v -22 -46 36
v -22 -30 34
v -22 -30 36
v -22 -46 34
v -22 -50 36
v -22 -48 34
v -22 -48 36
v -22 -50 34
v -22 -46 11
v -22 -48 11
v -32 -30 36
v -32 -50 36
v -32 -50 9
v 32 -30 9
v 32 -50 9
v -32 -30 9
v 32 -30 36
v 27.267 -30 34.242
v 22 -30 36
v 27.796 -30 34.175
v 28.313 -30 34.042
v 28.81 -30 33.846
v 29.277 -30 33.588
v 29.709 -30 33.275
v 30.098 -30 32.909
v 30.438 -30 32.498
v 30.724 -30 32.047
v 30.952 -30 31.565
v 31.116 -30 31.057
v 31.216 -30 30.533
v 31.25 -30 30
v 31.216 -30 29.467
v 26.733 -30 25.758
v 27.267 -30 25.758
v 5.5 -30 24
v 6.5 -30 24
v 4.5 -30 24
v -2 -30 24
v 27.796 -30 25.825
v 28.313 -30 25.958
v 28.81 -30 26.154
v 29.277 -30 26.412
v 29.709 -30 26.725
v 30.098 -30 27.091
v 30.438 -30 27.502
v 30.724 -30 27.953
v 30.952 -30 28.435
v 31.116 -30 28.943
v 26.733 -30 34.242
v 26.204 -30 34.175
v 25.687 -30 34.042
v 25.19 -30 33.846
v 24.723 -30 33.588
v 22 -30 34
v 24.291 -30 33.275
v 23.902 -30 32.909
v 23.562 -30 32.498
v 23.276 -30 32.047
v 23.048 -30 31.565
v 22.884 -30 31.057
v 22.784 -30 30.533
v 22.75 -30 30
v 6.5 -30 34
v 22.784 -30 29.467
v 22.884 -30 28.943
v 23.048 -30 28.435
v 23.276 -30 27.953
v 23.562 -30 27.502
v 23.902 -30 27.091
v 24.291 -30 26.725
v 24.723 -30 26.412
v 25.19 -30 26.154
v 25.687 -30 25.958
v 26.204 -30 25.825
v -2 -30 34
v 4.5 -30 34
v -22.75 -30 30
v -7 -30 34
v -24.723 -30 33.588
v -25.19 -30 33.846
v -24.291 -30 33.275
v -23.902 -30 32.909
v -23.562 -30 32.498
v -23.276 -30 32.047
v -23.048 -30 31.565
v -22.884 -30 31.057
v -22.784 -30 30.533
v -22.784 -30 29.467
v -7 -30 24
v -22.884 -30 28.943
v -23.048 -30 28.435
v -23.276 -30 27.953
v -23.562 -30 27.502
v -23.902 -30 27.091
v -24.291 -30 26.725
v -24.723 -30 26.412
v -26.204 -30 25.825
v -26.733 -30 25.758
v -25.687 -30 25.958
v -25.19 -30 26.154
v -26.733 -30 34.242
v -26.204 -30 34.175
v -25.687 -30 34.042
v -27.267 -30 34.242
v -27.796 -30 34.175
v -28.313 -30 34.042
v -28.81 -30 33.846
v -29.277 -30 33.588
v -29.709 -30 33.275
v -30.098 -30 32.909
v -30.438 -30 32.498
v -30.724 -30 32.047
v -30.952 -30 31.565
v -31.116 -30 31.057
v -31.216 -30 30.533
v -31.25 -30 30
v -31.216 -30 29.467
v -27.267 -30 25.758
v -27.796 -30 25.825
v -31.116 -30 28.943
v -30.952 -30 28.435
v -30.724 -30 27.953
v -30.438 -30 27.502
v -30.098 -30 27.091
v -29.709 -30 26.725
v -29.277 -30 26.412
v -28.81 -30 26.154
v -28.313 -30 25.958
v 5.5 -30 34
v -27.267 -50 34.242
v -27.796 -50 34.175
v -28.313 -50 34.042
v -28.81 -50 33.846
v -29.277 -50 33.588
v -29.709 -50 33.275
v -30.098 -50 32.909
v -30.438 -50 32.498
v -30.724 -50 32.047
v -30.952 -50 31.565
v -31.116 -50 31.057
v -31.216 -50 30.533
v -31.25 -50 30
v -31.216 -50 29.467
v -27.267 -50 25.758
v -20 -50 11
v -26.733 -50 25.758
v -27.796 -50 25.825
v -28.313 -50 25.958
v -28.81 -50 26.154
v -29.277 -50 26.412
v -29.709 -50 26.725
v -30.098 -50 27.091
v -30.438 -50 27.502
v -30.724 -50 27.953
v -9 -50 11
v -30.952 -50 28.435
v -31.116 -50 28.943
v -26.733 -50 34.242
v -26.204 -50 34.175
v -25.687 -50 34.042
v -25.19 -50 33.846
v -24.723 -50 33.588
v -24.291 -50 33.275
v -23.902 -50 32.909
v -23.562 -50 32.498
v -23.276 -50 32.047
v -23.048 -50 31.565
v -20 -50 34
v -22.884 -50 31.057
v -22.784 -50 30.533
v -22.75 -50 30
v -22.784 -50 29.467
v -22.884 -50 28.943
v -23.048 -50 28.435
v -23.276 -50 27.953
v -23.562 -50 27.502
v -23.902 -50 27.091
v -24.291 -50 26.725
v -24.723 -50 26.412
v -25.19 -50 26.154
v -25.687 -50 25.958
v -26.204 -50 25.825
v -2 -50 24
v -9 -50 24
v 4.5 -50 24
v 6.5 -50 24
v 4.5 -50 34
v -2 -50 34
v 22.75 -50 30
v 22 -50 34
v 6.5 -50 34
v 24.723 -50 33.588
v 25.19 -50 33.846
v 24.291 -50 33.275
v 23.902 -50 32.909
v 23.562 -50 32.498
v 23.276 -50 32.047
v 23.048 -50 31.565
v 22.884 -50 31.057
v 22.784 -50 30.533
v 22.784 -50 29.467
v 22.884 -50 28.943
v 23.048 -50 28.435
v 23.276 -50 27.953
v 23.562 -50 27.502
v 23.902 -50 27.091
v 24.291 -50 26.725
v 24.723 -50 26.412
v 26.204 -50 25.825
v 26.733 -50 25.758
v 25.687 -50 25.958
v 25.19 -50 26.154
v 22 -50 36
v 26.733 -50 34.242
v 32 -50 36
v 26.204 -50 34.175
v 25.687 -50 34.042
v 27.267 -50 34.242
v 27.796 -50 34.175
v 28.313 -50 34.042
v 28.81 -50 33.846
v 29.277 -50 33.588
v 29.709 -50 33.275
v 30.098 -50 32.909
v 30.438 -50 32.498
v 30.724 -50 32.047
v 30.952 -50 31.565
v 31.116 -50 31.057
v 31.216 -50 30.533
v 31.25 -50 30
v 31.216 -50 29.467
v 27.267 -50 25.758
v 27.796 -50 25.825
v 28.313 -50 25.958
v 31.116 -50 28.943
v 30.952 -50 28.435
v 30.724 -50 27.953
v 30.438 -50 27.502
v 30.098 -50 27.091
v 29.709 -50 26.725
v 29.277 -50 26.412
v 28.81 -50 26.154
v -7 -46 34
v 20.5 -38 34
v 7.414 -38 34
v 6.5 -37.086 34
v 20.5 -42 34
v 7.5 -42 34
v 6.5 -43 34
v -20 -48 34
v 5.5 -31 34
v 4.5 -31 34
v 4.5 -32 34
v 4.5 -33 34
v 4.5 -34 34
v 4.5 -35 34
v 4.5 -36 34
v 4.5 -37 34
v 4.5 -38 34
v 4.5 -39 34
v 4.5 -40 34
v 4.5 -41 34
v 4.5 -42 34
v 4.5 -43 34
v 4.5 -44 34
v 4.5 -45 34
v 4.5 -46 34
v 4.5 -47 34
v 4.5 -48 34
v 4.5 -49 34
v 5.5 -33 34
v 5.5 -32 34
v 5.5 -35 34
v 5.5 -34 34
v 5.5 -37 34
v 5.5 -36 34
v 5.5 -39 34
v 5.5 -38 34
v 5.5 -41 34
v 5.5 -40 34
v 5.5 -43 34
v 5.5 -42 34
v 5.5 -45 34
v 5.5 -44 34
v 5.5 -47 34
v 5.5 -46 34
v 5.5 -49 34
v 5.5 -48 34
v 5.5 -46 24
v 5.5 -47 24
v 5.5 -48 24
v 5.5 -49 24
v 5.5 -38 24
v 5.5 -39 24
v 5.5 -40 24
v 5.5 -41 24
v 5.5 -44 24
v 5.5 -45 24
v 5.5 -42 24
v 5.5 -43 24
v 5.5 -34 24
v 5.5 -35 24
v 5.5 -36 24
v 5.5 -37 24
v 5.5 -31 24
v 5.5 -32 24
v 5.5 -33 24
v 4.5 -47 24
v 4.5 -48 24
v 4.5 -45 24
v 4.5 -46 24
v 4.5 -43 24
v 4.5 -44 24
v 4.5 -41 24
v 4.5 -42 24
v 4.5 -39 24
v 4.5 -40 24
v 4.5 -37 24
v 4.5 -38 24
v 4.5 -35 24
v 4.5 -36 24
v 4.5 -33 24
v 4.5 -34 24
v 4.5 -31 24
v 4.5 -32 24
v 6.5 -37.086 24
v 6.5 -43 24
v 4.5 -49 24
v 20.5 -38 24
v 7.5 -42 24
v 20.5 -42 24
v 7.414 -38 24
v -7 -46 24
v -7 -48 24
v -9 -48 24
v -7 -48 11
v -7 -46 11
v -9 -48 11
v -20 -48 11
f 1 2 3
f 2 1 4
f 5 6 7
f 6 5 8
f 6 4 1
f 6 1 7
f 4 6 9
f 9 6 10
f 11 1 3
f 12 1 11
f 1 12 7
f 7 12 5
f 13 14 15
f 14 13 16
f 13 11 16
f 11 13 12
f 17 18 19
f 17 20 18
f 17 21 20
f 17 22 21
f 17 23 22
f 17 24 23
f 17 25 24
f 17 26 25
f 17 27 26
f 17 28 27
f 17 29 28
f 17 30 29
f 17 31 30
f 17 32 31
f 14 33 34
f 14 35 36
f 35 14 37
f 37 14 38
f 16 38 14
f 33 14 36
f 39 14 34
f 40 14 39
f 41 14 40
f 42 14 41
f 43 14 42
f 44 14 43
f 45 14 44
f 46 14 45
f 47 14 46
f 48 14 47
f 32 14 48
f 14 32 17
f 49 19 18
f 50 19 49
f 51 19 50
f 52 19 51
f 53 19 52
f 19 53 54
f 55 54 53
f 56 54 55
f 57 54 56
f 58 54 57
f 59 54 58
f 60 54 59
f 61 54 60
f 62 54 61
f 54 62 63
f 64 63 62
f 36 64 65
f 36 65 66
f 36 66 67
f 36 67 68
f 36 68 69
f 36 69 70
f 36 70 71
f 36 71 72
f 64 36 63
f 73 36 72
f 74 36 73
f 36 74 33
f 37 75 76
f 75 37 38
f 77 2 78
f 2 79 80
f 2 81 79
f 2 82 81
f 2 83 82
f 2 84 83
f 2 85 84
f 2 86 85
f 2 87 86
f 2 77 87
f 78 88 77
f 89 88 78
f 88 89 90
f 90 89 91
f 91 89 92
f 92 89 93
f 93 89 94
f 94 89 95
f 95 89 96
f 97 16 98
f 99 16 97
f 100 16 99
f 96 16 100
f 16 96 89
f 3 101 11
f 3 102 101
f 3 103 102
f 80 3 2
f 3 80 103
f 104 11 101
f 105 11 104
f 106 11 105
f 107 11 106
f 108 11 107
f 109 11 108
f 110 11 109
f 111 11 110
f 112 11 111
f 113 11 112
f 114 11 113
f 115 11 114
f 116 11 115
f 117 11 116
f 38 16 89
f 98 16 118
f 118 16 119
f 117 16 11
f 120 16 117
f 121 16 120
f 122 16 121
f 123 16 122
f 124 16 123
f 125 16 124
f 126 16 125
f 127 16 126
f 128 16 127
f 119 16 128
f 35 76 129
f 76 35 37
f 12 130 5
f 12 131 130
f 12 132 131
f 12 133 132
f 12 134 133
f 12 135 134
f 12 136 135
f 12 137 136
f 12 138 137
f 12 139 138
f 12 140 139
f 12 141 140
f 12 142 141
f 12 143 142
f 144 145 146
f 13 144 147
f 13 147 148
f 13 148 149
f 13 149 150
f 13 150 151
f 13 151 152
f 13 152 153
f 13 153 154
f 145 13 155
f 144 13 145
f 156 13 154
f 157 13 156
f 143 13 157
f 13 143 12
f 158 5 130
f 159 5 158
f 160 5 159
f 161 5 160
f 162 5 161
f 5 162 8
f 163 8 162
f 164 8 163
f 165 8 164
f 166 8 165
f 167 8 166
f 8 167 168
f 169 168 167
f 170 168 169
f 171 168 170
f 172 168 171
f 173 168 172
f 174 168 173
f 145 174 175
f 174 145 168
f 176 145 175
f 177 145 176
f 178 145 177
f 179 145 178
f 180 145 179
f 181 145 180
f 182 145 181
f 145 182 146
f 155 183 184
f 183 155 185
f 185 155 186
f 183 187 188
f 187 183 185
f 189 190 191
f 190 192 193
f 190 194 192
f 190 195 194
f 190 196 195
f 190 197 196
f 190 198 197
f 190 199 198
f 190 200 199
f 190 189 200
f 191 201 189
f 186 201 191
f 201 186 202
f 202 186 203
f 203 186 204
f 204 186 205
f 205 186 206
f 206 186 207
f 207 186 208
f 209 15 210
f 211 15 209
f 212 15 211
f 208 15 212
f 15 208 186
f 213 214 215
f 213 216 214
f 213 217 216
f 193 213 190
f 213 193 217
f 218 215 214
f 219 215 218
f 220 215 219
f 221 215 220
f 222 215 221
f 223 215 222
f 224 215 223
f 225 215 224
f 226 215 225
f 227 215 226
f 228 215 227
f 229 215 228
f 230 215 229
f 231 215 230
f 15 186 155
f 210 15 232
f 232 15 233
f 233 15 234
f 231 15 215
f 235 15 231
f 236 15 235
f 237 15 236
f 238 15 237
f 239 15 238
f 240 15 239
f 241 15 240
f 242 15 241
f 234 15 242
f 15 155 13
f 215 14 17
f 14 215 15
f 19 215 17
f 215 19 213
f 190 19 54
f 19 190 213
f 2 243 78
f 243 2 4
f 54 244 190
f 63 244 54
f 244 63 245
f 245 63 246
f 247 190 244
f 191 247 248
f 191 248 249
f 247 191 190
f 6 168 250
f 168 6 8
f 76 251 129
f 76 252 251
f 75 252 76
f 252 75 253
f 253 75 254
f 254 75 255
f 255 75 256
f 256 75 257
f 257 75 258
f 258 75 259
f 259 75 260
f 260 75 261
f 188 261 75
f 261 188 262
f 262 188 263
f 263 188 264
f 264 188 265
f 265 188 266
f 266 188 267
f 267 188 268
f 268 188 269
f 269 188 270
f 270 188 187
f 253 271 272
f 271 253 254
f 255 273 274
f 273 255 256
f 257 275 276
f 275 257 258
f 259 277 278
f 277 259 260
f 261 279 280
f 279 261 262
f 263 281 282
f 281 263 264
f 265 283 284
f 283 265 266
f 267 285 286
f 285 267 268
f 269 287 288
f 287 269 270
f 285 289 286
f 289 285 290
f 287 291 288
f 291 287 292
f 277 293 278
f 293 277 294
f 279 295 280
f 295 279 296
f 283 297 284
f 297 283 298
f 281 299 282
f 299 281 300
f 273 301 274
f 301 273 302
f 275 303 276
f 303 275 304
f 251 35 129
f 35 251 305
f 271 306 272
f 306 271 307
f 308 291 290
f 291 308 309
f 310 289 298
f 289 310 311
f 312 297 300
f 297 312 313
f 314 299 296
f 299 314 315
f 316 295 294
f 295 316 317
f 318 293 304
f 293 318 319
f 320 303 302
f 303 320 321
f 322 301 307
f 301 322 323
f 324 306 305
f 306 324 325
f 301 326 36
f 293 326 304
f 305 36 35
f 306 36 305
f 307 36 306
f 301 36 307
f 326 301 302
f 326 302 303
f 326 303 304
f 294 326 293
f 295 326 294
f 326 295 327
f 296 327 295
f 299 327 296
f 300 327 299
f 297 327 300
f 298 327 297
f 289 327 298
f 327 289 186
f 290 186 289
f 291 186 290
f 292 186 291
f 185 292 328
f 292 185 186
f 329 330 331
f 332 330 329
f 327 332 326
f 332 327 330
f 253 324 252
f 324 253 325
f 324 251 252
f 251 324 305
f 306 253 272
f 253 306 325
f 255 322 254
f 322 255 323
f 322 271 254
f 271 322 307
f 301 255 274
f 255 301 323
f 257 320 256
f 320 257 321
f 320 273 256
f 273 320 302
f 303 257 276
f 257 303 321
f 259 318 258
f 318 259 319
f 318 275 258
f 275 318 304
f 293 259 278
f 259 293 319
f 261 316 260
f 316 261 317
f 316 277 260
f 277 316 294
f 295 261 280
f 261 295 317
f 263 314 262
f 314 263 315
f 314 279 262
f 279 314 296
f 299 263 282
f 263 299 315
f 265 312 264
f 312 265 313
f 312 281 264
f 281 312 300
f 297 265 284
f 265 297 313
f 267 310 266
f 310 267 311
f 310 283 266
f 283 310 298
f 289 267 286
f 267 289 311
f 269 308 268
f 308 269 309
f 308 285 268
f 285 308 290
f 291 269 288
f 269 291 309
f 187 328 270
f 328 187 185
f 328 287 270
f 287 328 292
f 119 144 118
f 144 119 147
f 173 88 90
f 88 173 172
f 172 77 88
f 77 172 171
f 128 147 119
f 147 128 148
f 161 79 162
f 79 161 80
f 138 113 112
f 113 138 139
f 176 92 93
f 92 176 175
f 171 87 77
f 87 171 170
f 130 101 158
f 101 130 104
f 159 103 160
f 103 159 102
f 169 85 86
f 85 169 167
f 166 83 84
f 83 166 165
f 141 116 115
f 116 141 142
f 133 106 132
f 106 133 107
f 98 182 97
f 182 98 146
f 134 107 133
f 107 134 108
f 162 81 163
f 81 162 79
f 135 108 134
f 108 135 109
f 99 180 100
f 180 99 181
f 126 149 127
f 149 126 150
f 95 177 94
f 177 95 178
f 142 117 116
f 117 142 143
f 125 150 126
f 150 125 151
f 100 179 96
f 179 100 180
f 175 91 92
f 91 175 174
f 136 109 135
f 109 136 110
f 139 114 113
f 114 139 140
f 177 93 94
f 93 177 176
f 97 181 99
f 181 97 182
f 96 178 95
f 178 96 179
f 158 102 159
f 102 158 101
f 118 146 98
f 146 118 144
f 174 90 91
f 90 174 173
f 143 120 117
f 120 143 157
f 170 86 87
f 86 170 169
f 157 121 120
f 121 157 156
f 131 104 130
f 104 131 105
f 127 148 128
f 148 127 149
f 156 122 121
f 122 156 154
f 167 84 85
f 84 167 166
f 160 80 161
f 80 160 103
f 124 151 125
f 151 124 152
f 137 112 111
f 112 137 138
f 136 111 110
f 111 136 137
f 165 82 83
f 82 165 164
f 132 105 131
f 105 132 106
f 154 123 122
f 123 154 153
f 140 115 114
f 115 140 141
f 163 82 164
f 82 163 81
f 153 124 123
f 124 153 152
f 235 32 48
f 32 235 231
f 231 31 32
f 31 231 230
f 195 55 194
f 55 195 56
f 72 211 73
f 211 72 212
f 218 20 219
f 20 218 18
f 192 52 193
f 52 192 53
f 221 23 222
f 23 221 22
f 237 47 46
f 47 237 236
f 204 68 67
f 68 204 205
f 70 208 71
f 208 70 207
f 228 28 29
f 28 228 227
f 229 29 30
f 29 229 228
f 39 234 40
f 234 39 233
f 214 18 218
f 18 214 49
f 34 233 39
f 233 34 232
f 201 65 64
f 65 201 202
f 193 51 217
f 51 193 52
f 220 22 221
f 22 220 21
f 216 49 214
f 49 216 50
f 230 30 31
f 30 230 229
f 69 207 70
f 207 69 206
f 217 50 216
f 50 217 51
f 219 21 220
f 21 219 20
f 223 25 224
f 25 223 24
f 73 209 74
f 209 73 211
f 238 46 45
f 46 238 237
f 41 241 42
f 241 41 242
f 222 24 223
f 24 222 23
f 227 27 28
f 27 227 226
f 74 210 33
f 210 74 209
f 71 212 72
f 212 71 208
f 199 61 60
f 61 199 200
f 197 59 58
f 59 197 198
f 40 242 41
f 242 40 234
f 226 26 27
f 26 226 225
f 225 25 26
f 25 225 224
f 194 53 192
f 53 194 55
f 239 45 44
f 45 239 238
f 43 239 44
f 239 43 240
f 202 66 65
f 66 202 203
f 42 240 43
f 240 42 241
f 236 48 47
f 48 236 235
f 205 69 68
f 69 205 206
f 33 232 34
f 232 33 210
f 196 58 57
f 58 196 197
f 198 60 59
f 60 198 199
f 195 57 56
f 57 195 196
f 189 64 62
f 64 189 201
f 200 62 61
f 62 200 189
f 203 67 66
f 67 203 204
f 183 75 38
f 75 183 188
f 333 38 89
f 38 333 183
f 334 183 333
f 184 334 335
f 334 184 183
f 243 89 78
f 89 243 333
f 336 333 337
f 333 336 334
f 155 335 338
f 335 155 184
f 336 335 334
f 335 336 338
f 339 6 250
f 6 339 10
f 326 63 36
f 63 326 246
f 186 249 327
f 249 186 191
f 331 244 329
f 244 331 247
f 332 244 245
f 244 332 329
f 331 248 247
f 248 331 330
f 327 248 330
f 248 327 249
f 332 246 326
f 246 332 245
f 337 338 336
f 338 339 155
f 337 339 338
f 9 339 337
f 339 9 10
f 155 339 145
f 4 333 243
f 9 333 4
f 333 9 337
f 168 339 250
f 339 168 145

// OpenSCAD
w=28.5/2;
w2=31.5-28.5;//17.5x7;
$fn=50;
bh=30;
rh=37;
//translate([0,-80,-0]){motor_end();}
//pully_end();
//translate([0,15,0]){pully_end_tension();}
translate([0,-30,0]){chariault();}
module motor_end(){
difference(){
union(){
translate([-32,-20,-1]){cube([10,40,rh]);}    
translate([22,-20,-1]){cube([10,40,rh]);}
translate([-22,-20,-1]){cube([44,40,20]);}
    
}
motor();
translate([0,0,-1]){cylinder(19,w-2,w-2);}

bracket();
rod_mounts(-27,-20,bh);
rod_mounts(27,-20,bh);
}
}

module pully_end(){
    ps = 4.6/2;
 difference(){   
   union(){  
       translate([-33,-20,-1]){cube([12,10,rh]);}    
translate([21,-20,-1]){cube([12,10,rh]);}
   translate([-22,-20,-1]){cube([44,10,20]);}
   translate([-0,-15,-1]){cylinder(36,ps,ps);}
   }
   rod_mounts(-27,-20,bh);
rod_mounts(27,-20,bh);
 
    rod_mounts(0,-20,10,4.5);
}
    
    
    }
module pully_end_tension(){
    
 difference(){   
   union(){  
   translate([-22,-20,-1]){cube([44,10,20]);}
   translate([-33,-20,-1]){cube([12,10,rh]);}    
translate([21,-20,-1]){cube([12,10,rh]);}
   }rod_mounts(-27,-52,bh);
rod_mounts(27,-52,bh);
    rod_mounts(0,-20,10,10);
}
    
    
    }    
module chariault(){
    hh=24;
difference(){
union(){
translate([-32,-20,9]){cube([10,20,rh-10]);}    
translate([22,-20,9]){cube([10,20,rh-10]);}
translate([-22,-20,9]){cube([44,20,25]);}
    
}
rod_mounts(-27,-20,bh);
rod_mounts(27,-20,bh);
for(y=[0:2:20]){
   translate([4.5,-y,hh]){cube([1,1,10]);} 
    }
   translate([-7,-20,hh]){cube([5,20,10]);}     
   translate([-9,-20,hh]){cube([5,2,10]);}  
    translate([5.5,-20,hh]){cube([1,20,10]);} 
     translate([5.5,-12,hh]){cube([15,4,10]);} 
     translate([6.5,-13,hh]){rotate([0,0,45]){cube([2,1,10]);} }
      translate([7.0,-9,hh]){rotate([0,0,45]){cube([1,2,10]);} }
      translate([-22,-18,11]){cube([15,2,hh+2]);} 
      translate([-20,-20,11]){cube([11,2,hh+2]);} 
}    
 
    
}    
    
module motor(){
difference(){
cylinder(19,w,w);

}    
translate([-17.5/2,31.5/2-7,0]){cube([17.5,8,19]);}
translate([-3,31.5/2-7+5,19-5]){cube([6,7,5]);}
//bracket();
}
//42  d7
module bracket(){
translate([-21+7/2,-7/2,18]){
  difference(){
   union(){
    translate([0,7/2,0]){cylinder(1,7/2,7/2);}
    translate([0,0,0]){cube([42-7,7,1]);}
    translate([42-7,7/2,0]){cylinder(1,7/2,7/2);}
   
   translate([0,7/2,-5]){cylinder(5,1,2);}
   translate([42-7,7/2,-5]){cylinder(5,1,2);}
   }
  }
 }
}

module rod_mounts(x,y,z,rd=8.5){
    rw= rd/2;
   translate([x,y,z]){ rotate([-90,0,0]){cylinder(40,rw,rw);}}
    
    
    }
